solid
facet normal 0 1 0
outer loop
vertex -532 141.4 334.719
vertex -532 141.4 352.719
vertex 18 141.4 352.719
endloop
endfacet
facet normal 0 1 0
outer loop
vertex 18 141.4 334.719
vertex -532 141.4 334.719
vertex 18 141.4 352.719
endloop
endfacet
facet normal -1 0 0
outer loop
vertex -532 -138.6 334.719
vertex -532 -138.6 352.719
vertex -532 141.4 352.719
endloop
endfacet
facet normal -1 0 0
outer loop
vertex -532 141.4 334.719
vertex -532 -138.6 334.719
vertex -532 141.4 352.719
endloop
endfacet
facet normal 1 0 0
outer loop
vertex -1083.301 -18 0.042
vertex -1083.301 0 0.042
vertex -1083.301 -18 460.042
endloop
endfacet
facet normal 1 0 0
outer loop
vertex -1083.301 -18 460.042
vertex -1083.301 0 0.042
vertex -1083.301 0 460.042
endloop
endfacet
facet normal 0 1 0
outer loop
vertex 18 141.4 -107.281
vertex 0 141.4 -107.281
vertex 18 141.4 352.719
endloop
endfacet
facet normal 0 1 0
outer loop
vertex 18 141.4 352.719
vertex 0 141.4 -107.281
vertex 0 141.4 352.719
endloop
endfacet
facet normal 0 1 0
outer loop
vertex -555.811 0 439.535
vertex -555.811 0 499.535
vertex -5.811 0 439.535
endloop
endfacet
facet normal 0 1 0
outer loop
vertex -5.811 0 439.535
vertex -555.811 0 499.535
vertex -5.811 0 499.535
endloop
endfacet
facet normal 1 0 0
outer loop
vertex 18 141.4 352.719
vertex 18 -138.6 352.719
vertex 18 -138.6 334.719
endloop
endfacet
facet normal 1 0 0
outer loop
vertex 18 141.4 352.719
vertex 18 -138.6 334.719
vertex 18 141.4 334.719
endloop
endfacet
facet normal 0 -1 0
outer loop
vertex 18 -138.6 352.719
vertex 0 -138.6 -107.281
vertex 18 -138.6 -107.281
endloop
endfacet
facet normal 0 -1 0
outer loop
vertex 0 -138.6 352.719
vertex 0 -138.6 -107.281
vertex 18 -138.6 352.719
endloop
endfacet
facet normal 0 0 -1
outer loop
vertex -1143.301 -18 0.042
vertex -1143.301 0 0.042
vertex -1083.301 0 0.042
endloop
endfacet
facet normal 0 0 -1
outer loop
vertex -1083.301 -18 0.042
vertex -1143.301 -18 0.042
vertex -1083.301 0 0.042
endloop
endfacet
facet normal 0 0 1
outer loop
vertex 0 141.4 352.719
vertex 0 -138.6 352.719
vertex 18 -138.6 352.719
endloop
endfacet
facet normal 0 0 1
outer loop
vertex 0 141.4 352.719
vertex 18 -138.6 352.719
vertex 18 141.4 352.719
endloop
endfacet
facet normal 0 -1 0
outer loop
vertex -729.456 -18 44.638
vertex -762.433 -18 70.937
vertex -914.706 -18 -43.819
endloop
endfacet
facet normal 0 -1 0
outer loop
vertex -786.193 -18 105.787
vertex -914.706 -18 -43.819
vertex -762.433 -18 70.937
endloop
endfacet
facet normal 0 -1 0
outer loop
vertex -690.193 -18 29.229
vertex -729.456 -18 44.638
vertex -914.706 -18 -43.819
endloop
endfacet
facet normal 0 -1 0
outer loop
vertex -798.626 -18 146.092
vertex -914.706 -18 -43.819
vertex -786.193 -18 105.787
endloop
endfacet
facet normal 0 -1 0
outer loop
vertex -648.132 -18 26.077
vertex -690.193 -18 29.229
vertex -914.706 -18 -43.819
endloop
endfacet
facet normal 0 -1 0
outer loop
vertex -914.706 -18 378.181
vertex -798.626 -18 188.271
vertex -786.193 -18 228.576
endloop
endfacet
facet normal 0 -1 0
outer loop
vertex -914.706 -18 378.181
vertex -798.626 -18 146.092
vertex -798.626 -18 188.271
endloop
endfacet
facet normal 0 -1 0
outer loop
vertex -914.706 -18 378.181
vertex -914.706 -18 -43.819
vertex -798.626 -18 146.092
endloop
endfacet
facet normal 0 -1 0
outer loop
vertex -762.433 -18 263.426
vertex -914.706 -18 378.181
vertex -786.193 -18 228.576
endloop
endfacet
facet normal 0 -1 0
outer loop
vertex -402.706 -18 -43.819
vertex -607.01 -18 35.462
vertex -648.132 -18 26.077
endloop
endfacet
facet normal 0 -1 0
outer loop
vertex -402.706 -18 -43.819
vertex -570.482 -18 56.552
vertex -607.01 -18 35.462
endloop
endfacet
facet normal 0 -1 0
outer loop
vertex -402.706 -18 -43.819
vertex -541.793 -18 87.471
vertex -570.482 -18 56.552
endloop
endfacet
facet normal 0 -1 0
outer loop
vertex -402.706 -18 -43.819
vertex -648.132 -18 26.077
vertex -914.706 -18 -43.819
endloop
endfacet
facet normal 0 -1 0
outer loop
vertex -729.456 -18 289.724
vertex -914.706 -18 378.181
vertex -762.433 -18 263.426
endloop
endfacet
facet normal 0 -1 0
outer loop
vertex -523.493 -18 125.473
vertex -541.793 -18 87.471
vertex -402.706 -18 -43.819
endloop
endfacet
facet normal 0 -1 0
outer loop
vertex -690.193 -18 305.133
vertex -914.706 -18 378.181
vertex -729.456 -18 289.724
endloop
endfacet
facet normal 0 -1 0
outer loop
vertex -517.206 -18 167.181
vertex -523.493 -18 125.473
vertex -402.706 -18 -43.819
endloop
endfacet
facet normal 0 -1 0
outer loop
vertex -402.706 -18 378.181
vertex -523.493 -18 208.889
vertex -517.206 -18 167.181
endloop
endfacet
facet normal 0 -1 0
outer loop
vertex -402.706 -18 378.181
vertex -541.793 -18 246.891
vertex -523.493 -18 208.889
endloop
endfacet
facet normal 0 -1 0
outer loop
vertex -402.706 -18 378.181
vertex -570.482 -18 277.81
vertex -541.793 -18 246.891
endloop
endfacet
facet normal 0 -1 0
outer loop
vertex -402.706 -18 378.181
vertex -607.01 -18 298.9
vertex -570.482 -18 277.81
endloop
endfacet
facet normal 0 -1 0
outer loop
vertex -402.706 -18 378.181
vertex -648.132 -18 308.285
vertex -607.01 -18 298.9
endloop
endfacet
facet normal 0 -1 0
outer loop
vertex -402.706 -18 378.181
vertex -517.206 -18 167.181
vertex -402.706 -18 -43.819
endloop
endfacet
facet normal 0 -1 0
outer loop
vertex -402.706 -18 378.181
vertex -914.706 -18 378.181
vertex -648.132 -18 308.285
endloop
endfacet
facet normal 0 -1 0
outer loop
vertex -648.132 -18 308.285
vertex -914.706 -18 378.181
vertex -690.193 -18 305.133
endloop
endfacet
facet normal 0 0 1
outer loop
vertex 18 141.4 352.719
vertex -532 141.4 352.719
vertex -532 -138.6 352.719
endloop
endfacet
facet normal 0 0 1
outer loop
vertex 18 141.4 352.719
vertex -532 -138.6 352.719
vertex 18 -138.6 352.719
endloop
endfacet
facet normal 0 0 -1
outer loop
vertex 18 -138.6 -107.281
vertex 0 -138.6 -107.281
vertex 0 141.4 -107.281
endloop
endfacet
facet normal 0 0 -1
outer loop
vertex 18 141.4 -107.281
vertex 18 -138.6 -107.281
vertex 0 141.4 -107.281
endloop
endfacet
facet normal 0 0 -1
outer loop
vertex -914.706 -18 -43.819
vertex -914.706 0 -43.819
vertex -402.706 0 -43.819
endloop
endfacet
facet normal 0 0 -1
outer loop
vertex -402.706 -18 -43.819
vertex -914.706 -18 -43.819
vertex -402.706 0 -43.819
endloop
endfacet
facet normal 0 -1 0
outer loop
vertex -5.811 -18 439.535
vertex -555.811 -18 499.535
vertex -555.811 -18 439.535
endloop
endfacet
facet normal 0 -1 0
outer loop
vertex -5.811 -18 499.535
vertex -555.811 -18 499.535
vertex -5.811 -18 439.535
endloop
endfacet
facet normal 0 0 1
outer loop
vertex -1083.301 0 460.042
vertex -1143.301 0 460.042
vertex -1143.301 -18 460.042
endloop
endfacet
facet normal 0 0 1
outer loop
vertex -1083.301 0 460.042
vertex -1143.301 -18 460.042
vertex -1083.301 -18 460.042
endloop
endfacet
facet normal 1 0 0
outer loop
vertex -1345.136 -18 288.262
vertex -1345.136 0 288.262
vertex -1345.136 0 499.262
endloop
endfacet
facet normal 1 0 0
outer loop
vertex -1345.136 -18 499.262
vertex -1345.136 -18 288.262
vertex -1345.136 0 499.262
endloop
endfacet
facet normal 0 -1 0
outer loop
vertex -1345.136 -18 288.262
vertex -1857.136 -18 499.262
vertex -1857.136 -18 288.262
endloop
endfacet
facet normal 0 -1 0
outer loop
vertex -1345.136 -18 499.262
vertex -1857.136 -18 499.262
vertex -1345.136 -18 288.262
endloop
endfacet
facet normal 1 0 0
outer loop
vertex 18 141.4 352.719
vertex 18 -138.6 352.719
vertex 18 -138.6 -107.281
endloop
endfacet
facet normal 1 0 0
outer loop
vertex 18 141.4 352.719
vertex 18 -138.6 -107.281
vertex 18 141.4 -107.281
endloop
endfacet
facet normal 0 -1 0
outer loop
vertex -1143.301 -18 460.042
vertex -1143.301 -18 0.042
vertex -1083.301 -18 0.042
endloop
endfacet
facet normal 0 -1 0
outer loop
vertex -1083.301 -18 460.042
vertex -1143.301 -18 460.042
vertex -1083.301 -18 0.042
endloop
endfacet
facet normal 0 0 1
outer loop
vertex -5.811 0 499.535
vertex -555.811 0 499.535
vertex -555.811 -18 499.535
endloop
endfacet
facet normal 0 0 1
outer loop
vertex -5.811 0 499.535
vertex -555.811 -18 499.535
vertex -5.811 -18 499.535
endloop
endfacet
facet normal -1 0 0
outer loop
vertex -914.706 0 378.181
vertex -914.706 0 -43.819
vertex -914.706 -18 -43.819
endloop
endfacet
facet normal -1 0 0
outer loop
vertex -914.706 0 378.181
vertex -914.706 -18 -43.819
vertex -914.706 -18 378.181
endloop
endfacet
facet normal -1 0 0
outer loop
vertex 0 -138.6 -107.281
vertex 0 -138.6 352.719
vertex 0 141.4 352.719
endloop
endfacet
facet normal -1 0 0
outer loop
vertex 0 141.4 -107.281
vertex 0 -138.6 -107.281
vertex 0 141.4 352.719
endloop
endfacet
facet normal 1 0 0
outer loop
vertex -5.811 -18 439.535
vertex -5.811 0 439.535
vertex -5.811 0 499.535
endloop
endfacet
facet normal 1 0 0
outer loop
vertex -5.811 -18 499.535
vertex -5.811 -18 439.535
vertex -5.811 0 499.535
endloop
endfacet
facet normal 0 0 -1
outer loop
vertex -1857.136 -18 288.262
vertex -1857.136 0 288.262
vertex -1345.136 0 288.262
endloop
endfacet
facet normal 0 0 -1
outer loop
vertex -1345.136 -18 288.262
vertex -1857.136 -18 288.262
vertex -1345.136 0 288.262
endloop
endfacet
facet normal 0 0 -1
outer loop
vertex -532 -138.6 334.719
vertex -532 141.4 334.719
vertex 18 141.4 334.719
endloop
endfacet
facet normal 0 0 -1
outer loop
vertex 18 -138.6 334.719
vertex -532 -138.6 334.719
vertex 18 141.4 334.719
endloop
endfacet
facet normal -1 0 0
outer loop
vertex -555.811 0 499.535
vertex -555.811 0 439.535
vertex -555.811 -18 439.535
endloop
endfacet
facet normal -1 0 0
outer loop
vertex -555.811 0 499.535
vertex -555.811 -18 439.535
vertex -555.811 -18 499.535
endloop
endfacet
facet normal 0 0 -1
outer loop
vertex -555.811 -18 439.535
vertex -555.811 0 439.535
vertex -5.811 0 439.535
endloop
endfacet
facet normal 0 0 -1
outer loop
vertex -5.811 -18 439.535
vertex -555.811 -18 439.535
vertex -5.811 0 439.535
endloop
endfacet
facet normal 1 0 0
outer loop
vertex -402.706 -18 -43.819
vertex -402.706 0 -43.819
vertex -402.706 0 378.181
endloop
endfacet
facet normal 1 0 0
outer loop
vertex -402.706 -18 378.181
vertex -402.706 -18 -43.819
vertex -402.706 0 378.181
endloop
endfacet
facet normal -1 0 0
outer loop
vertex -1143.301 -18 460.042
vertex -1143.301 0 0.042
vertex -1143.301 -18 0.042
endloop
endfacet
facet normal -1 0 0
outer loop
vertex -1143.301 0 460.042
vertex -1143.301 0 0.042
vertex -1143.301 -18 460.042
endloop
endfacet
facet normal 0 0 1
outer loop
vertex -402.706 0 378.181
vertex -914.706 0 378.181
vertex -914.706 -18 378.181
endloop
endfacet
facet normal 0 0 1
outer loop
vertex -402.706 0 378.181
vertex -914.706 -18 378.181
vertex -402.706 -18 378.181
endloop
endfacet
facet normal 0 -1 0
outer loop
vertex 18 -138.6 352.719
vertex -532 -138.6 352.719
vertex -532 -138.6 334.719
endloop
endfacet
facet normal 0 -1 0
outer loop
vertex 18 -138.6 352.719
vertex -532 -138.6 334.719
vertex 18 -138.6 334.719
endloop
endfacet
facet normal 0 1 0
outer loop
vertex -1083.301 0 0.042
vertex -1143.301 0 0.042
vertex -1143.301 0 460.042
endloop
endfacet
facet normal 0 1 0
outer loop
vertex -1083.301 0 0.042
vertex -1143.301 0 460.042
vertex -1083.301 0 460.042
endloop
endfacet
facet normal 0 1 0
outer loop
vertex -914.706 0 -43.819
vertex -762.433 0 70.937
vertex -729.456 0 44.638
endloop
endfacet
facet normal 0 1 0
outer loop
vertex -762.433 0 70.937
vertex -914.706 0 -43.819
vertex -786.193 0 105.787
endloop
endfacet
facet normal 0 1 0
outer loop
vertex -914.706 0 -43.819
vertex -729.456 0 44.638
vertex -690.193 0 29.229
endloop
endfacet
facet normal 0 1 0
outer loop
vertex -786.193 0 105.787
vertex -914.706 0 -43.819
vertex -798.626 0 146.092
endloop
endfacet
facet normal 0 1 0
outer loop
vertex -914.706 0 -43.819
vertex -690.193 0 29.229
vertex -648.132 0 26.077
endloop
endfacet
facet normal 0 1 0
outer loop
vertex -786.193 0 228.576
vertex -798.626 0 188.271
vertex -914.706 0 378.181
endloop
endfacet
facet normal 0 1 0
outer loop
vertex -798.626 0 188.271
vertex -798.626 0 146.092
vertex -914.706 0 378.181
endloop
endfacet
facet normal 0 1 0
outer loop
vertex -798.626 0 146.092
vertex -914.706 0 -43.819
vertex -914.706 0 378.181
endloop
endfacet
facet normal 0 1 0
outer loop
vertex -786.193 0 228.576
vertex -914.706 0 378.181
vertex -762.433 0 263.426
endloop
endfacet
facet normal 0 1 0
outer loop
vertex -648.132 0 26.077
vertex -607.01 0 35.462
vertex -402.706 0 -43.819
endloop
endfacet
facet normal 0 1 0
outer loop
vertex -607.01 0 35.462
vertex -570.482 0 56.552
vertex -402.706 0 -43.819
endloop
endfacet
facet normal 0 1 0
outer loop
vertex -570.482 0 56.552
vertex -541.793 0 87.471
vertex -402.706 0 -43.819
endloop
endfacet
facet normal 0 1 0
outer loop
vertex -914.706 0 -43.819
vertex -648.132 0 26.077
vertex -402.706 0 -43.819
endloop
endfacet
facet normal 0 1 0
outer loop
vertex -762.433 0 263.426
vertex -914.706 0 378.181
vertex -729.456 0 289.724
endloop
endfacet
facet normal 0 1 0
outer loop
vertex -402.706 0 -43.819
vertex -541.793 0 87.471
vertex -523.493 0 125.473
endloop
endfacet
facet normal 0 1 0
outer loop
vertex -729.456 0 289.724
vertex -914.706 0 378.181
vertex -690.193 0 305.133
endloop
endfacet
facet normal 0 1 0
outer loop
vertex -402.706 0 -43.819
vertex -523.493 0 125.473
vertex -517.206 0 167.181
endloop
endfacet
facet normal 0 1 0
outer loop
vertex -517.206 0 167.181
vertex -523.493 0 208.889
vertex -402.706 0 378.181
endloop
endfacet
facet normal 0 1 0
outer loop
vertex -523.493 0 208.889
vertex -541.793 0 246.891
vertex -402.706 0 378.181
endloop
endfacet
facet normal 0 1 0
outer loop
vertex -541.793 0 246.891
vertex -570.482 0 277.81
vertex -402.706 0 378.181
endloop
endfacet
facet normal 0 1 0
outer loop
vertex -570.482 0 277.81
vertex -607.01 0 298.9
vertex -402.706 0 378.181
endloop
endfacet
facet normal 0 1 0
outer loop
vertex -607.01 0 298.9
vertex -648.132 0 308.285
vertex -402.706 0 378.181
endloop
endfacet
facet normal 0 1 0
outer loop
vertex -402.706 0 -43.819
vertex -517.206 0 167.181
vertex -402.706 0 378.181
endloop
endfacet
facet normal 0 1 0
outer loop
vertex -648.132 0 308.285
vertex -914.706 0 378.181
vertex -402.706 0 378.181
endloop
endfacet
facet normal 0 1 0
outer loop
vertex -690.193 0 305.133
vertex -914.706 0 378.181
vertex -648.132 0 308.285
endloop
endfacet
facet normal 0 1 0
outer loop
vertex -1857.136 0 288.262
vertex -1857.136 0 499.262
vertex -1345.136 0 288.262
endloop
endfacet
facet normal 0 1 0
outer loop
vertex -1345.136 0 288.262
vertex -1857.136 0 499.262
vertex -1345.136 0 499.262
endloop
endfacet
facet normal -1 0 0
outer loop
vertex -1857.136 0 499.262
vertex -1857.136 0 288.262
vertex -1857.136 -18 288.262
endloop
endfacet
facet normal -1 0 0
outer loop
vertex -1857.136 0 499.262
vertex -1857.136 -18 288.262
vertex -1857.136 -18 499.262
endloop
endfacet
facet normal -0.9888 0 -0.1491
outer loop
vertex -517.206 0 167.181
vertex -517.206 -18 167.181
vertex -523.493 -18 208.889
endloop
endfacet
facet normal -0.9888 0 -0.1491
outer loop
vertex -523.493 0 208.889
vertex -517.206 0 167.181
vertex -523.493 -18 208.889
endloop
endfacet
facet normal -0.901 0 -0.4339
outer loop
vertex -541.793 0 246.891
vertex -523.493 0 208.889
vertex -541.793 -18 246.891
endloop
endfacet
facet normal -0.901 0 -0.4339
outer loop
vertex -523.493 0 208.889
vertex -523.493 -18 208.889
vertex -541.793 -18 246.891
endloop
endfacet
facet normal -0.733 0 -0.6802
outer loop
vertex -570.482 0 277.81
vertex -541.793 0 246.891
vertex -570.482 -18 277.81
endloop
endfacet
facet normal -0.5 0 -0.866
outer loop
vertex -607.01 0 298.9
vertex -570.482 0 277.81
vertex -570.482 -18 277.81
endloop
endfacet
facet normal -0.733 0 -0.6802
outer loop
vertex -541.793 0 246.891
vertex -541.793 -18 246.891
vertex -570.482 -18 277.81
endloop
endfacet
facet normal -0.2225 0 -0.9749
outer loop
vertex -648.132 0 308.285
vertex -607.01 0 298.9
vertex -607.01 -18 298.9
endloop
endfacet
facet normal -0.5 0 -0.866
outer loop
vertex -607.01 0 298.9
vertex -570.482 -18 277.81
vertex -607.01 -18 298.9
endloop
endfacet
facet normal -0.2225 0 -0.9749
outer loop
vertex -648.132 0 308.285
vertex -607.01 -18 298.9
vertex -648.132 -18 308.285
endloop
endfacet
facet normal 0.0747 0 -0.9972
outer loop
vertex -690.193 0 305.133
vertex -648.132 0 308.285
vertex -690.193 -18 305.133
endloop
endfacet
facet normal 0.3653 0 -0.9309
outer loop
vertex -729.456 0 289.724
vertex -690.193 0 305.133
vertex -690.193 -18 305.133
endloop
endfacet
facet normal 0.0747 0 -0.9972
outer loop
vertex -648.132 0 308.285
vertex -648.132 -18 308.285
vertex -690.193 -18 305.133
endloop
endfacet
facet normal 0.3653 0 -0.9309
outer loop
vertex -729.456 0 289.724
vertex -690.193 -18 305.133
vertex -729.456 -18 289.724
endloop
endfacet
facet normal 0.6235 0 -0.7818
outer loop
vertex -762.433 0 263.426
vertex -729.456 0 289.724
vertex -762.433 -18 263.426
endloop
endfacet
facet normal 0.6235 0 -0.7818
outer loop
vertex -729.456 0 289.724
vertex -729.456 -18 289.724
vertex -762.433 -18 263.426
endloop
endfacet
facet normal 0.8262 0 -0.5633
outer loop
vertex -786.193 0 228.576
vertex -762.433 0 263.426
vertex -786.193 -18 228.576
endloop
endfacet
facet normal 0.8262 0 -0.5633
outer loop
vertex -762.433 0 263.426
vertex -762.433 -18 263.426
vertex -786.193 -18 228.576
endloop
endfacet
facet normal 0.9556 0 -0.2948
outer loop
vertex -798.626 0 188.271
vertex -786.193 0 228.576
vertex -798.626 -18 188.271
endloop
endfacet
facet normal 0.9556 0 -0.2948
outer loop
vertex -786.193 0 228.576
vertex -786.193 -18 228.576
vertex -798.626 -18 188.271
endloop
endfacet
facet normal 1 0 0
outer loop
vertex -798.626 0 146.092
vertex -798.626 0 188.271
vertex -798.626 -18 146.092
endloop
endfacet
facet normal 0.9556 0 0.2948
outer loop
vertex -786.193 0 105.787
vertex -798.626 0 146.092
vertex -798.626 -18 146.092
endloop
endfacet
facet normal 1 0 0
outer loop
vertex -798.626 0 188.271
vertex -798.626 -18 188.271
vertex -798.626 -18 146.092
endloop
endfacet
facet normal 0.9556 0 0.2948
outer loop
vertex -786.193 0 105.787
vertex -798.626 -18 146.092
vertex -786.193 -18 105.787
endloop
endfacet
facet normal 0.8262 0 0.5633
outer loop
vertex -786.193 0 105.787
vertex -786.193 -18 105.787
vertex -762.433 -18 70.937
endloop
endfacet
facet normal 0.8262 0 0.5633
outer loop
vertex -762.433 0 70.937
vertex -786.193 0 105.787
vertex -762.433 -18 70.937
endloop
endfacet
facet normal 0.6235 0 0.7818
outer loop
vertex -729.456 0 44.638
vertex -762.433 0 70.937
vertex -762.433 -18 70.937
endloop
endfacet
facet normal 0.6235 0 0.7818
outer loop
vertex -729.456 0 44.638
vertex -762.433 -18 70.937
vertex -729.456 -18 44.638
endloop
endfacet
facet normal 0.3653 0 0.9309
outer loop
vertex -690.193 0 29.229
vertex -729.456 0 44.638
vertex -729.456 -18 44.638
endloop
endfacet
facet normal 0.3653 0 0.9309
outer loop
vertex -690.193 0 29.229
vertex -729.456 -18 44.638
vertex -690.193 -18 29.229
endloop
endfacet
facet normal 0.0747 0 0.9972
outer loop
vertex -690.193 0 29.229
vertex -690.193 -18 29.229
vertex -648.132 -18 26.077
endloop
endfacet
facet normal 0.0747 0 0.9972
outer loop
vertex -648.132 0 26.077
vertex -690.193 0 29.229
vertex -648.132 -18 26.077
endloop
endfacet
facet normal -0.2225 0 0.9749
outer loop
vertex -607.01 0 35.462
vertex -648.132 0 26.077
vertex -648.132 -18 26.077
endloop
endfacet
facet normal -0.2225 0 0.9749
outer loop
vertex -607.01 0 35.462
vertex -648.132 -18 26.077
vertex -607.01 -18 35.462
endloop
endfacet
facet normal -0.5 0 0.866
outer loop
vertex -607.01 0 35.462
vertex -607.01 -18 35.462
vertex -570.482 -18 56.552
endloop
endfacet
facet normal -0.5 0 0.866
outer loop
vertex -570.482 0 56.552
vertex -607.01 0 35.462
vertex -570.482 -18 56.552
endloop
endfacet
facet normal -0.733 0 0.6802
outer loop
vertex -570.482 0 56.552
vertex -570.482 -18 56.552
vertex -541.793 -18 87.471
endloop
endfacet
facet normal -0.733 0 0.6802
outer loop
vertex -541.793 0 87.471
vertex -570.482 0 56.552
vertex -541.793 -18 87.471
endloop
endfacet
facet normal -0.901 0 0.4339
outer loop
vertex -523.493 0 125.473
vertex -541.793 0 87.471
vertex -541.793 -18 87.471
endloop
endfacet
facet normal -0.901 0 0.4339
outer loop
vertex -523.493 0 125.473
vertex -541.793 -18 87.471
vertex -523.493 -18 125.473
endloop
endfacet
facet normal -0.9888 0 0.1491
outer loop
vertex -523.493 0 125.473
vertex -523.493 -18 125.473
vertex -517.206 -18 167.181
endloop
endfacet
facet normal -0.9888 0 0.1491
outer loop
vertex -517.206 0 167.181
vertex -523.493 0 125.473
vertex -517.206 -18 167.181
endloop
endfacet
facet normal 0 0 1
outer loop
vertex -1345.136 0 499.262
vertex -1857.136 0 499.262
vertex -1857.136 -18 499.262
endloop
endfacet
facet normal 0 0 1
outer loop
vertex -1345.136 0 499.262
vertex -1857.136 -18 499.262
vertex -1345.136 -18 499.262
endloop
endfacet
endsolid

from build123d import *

# Parameters (mm, degrees)
F0_W      = 280
F0_H      = 460
F1_DEPTH  = 18
F2_W      = 550
F2_H      = 280
F3_DEPTH  = 18
F4_W      = 550
F4_H      = 60
F5_DEPTH  = 18
F6_W      = 60
F6_H      = 460
F7_DEPTH  = 18
F8_W      = 25
F8_H      = 422
F9_DEPTH  = 18
F10_W     = 462
F10_H     = 25
F11_DEPTH = 18
F13_W     = 512
F13_H     = 211
F14_DEPTH = 18
F15_W     = 512
F15_H     = 422
F16_DEPTH = 18
F17_R     = 141.5
F18_DEPTH = 159.400582


with BuildPart() as f1:
    # F0 (on Right) → F1 (new body)
    with BuildSketch(Plane.YZ):
        with Locations((1.399582, 122.71885)):
            Rectangle(F0_W, F0_H)
    extrude(amount=F1_DEPTH)


with BuildPart() as f3:
    # F2 (on face) → F3 (new body)
    with BuildSketch(Plane.XY.offset(352.71885)):
        with Locations((-257, 1.399582)):
            Rectangle(F2_W, F2_H)
    extrude(amount=-F3_DEPTH)


with BuildPart() as f5:
    # F4 (on Front) → F5 (new body)
    with BuildSketch(Plane.XZ):
        with Locations((-280.81126, 469.535388)):
            Rectangle(F4_W, F4_H)
    extrude(amount=F5_DEPTH)


with BuildPart() as f7:
    # F6 (on Front) → F7 (new body)
    with BuildSketch(Plane.XZ):
        with Locations((-1113.300681, 230.041797)):
            Rectangle(F6_W, F6_H)
    extrude(amount=F7_DEPTH)


with BuildPart() as f9:
    # F8 (on Front) → F9 (new body)
    with BuildSketch(Plane.XZ):
        with Locations((-1553.912302, 173.467372)):
            Rectangle(F8_W, F8_H)
    extrude(amount=F9_DEPTH)


with BuildPart() as f11:
    # F10 (on Front) → F11 (new body)
    with BuildSketch(Plane.XZ):
        with Locations((-1266.772479, 592.864828)):
            Rectangle(F10_W, F10_H)
    extrude(amount=F11_DEPTH)


with BuildPart() as f14:
    # F13 (on Front) → F14 (new body)
    with BuildSketch(Plane.XZ):
        with Locations((-1601.136148, 393.762083)):
            Rectangle(F13_W, F13_H)
    extrude(amount=F14_DEPTH)


with BuildPart() as f16:
    # F15 (on Front) → F16 (new body)
    with BuildSketch(Plane.XZ):
        with Locations((-658.706233, 167.181071)):
            Rectangle(F15_W, F15_H)
    extrude(amount=F16_DEPTH)

    # F17 (on face) → F18 (cut, through all)
    with BuildSketch(Plane.XZ.offset(18)):
        with Locations((-658.706233, 167.181071)):
            Circle(F17_R)
    extrude(amount=-F18_DEPTH, mode=Mode.SUBTRACT)


solid = Compound([f1.part, f3.part, f5.part, f7.part, f14.part, f16.part])
